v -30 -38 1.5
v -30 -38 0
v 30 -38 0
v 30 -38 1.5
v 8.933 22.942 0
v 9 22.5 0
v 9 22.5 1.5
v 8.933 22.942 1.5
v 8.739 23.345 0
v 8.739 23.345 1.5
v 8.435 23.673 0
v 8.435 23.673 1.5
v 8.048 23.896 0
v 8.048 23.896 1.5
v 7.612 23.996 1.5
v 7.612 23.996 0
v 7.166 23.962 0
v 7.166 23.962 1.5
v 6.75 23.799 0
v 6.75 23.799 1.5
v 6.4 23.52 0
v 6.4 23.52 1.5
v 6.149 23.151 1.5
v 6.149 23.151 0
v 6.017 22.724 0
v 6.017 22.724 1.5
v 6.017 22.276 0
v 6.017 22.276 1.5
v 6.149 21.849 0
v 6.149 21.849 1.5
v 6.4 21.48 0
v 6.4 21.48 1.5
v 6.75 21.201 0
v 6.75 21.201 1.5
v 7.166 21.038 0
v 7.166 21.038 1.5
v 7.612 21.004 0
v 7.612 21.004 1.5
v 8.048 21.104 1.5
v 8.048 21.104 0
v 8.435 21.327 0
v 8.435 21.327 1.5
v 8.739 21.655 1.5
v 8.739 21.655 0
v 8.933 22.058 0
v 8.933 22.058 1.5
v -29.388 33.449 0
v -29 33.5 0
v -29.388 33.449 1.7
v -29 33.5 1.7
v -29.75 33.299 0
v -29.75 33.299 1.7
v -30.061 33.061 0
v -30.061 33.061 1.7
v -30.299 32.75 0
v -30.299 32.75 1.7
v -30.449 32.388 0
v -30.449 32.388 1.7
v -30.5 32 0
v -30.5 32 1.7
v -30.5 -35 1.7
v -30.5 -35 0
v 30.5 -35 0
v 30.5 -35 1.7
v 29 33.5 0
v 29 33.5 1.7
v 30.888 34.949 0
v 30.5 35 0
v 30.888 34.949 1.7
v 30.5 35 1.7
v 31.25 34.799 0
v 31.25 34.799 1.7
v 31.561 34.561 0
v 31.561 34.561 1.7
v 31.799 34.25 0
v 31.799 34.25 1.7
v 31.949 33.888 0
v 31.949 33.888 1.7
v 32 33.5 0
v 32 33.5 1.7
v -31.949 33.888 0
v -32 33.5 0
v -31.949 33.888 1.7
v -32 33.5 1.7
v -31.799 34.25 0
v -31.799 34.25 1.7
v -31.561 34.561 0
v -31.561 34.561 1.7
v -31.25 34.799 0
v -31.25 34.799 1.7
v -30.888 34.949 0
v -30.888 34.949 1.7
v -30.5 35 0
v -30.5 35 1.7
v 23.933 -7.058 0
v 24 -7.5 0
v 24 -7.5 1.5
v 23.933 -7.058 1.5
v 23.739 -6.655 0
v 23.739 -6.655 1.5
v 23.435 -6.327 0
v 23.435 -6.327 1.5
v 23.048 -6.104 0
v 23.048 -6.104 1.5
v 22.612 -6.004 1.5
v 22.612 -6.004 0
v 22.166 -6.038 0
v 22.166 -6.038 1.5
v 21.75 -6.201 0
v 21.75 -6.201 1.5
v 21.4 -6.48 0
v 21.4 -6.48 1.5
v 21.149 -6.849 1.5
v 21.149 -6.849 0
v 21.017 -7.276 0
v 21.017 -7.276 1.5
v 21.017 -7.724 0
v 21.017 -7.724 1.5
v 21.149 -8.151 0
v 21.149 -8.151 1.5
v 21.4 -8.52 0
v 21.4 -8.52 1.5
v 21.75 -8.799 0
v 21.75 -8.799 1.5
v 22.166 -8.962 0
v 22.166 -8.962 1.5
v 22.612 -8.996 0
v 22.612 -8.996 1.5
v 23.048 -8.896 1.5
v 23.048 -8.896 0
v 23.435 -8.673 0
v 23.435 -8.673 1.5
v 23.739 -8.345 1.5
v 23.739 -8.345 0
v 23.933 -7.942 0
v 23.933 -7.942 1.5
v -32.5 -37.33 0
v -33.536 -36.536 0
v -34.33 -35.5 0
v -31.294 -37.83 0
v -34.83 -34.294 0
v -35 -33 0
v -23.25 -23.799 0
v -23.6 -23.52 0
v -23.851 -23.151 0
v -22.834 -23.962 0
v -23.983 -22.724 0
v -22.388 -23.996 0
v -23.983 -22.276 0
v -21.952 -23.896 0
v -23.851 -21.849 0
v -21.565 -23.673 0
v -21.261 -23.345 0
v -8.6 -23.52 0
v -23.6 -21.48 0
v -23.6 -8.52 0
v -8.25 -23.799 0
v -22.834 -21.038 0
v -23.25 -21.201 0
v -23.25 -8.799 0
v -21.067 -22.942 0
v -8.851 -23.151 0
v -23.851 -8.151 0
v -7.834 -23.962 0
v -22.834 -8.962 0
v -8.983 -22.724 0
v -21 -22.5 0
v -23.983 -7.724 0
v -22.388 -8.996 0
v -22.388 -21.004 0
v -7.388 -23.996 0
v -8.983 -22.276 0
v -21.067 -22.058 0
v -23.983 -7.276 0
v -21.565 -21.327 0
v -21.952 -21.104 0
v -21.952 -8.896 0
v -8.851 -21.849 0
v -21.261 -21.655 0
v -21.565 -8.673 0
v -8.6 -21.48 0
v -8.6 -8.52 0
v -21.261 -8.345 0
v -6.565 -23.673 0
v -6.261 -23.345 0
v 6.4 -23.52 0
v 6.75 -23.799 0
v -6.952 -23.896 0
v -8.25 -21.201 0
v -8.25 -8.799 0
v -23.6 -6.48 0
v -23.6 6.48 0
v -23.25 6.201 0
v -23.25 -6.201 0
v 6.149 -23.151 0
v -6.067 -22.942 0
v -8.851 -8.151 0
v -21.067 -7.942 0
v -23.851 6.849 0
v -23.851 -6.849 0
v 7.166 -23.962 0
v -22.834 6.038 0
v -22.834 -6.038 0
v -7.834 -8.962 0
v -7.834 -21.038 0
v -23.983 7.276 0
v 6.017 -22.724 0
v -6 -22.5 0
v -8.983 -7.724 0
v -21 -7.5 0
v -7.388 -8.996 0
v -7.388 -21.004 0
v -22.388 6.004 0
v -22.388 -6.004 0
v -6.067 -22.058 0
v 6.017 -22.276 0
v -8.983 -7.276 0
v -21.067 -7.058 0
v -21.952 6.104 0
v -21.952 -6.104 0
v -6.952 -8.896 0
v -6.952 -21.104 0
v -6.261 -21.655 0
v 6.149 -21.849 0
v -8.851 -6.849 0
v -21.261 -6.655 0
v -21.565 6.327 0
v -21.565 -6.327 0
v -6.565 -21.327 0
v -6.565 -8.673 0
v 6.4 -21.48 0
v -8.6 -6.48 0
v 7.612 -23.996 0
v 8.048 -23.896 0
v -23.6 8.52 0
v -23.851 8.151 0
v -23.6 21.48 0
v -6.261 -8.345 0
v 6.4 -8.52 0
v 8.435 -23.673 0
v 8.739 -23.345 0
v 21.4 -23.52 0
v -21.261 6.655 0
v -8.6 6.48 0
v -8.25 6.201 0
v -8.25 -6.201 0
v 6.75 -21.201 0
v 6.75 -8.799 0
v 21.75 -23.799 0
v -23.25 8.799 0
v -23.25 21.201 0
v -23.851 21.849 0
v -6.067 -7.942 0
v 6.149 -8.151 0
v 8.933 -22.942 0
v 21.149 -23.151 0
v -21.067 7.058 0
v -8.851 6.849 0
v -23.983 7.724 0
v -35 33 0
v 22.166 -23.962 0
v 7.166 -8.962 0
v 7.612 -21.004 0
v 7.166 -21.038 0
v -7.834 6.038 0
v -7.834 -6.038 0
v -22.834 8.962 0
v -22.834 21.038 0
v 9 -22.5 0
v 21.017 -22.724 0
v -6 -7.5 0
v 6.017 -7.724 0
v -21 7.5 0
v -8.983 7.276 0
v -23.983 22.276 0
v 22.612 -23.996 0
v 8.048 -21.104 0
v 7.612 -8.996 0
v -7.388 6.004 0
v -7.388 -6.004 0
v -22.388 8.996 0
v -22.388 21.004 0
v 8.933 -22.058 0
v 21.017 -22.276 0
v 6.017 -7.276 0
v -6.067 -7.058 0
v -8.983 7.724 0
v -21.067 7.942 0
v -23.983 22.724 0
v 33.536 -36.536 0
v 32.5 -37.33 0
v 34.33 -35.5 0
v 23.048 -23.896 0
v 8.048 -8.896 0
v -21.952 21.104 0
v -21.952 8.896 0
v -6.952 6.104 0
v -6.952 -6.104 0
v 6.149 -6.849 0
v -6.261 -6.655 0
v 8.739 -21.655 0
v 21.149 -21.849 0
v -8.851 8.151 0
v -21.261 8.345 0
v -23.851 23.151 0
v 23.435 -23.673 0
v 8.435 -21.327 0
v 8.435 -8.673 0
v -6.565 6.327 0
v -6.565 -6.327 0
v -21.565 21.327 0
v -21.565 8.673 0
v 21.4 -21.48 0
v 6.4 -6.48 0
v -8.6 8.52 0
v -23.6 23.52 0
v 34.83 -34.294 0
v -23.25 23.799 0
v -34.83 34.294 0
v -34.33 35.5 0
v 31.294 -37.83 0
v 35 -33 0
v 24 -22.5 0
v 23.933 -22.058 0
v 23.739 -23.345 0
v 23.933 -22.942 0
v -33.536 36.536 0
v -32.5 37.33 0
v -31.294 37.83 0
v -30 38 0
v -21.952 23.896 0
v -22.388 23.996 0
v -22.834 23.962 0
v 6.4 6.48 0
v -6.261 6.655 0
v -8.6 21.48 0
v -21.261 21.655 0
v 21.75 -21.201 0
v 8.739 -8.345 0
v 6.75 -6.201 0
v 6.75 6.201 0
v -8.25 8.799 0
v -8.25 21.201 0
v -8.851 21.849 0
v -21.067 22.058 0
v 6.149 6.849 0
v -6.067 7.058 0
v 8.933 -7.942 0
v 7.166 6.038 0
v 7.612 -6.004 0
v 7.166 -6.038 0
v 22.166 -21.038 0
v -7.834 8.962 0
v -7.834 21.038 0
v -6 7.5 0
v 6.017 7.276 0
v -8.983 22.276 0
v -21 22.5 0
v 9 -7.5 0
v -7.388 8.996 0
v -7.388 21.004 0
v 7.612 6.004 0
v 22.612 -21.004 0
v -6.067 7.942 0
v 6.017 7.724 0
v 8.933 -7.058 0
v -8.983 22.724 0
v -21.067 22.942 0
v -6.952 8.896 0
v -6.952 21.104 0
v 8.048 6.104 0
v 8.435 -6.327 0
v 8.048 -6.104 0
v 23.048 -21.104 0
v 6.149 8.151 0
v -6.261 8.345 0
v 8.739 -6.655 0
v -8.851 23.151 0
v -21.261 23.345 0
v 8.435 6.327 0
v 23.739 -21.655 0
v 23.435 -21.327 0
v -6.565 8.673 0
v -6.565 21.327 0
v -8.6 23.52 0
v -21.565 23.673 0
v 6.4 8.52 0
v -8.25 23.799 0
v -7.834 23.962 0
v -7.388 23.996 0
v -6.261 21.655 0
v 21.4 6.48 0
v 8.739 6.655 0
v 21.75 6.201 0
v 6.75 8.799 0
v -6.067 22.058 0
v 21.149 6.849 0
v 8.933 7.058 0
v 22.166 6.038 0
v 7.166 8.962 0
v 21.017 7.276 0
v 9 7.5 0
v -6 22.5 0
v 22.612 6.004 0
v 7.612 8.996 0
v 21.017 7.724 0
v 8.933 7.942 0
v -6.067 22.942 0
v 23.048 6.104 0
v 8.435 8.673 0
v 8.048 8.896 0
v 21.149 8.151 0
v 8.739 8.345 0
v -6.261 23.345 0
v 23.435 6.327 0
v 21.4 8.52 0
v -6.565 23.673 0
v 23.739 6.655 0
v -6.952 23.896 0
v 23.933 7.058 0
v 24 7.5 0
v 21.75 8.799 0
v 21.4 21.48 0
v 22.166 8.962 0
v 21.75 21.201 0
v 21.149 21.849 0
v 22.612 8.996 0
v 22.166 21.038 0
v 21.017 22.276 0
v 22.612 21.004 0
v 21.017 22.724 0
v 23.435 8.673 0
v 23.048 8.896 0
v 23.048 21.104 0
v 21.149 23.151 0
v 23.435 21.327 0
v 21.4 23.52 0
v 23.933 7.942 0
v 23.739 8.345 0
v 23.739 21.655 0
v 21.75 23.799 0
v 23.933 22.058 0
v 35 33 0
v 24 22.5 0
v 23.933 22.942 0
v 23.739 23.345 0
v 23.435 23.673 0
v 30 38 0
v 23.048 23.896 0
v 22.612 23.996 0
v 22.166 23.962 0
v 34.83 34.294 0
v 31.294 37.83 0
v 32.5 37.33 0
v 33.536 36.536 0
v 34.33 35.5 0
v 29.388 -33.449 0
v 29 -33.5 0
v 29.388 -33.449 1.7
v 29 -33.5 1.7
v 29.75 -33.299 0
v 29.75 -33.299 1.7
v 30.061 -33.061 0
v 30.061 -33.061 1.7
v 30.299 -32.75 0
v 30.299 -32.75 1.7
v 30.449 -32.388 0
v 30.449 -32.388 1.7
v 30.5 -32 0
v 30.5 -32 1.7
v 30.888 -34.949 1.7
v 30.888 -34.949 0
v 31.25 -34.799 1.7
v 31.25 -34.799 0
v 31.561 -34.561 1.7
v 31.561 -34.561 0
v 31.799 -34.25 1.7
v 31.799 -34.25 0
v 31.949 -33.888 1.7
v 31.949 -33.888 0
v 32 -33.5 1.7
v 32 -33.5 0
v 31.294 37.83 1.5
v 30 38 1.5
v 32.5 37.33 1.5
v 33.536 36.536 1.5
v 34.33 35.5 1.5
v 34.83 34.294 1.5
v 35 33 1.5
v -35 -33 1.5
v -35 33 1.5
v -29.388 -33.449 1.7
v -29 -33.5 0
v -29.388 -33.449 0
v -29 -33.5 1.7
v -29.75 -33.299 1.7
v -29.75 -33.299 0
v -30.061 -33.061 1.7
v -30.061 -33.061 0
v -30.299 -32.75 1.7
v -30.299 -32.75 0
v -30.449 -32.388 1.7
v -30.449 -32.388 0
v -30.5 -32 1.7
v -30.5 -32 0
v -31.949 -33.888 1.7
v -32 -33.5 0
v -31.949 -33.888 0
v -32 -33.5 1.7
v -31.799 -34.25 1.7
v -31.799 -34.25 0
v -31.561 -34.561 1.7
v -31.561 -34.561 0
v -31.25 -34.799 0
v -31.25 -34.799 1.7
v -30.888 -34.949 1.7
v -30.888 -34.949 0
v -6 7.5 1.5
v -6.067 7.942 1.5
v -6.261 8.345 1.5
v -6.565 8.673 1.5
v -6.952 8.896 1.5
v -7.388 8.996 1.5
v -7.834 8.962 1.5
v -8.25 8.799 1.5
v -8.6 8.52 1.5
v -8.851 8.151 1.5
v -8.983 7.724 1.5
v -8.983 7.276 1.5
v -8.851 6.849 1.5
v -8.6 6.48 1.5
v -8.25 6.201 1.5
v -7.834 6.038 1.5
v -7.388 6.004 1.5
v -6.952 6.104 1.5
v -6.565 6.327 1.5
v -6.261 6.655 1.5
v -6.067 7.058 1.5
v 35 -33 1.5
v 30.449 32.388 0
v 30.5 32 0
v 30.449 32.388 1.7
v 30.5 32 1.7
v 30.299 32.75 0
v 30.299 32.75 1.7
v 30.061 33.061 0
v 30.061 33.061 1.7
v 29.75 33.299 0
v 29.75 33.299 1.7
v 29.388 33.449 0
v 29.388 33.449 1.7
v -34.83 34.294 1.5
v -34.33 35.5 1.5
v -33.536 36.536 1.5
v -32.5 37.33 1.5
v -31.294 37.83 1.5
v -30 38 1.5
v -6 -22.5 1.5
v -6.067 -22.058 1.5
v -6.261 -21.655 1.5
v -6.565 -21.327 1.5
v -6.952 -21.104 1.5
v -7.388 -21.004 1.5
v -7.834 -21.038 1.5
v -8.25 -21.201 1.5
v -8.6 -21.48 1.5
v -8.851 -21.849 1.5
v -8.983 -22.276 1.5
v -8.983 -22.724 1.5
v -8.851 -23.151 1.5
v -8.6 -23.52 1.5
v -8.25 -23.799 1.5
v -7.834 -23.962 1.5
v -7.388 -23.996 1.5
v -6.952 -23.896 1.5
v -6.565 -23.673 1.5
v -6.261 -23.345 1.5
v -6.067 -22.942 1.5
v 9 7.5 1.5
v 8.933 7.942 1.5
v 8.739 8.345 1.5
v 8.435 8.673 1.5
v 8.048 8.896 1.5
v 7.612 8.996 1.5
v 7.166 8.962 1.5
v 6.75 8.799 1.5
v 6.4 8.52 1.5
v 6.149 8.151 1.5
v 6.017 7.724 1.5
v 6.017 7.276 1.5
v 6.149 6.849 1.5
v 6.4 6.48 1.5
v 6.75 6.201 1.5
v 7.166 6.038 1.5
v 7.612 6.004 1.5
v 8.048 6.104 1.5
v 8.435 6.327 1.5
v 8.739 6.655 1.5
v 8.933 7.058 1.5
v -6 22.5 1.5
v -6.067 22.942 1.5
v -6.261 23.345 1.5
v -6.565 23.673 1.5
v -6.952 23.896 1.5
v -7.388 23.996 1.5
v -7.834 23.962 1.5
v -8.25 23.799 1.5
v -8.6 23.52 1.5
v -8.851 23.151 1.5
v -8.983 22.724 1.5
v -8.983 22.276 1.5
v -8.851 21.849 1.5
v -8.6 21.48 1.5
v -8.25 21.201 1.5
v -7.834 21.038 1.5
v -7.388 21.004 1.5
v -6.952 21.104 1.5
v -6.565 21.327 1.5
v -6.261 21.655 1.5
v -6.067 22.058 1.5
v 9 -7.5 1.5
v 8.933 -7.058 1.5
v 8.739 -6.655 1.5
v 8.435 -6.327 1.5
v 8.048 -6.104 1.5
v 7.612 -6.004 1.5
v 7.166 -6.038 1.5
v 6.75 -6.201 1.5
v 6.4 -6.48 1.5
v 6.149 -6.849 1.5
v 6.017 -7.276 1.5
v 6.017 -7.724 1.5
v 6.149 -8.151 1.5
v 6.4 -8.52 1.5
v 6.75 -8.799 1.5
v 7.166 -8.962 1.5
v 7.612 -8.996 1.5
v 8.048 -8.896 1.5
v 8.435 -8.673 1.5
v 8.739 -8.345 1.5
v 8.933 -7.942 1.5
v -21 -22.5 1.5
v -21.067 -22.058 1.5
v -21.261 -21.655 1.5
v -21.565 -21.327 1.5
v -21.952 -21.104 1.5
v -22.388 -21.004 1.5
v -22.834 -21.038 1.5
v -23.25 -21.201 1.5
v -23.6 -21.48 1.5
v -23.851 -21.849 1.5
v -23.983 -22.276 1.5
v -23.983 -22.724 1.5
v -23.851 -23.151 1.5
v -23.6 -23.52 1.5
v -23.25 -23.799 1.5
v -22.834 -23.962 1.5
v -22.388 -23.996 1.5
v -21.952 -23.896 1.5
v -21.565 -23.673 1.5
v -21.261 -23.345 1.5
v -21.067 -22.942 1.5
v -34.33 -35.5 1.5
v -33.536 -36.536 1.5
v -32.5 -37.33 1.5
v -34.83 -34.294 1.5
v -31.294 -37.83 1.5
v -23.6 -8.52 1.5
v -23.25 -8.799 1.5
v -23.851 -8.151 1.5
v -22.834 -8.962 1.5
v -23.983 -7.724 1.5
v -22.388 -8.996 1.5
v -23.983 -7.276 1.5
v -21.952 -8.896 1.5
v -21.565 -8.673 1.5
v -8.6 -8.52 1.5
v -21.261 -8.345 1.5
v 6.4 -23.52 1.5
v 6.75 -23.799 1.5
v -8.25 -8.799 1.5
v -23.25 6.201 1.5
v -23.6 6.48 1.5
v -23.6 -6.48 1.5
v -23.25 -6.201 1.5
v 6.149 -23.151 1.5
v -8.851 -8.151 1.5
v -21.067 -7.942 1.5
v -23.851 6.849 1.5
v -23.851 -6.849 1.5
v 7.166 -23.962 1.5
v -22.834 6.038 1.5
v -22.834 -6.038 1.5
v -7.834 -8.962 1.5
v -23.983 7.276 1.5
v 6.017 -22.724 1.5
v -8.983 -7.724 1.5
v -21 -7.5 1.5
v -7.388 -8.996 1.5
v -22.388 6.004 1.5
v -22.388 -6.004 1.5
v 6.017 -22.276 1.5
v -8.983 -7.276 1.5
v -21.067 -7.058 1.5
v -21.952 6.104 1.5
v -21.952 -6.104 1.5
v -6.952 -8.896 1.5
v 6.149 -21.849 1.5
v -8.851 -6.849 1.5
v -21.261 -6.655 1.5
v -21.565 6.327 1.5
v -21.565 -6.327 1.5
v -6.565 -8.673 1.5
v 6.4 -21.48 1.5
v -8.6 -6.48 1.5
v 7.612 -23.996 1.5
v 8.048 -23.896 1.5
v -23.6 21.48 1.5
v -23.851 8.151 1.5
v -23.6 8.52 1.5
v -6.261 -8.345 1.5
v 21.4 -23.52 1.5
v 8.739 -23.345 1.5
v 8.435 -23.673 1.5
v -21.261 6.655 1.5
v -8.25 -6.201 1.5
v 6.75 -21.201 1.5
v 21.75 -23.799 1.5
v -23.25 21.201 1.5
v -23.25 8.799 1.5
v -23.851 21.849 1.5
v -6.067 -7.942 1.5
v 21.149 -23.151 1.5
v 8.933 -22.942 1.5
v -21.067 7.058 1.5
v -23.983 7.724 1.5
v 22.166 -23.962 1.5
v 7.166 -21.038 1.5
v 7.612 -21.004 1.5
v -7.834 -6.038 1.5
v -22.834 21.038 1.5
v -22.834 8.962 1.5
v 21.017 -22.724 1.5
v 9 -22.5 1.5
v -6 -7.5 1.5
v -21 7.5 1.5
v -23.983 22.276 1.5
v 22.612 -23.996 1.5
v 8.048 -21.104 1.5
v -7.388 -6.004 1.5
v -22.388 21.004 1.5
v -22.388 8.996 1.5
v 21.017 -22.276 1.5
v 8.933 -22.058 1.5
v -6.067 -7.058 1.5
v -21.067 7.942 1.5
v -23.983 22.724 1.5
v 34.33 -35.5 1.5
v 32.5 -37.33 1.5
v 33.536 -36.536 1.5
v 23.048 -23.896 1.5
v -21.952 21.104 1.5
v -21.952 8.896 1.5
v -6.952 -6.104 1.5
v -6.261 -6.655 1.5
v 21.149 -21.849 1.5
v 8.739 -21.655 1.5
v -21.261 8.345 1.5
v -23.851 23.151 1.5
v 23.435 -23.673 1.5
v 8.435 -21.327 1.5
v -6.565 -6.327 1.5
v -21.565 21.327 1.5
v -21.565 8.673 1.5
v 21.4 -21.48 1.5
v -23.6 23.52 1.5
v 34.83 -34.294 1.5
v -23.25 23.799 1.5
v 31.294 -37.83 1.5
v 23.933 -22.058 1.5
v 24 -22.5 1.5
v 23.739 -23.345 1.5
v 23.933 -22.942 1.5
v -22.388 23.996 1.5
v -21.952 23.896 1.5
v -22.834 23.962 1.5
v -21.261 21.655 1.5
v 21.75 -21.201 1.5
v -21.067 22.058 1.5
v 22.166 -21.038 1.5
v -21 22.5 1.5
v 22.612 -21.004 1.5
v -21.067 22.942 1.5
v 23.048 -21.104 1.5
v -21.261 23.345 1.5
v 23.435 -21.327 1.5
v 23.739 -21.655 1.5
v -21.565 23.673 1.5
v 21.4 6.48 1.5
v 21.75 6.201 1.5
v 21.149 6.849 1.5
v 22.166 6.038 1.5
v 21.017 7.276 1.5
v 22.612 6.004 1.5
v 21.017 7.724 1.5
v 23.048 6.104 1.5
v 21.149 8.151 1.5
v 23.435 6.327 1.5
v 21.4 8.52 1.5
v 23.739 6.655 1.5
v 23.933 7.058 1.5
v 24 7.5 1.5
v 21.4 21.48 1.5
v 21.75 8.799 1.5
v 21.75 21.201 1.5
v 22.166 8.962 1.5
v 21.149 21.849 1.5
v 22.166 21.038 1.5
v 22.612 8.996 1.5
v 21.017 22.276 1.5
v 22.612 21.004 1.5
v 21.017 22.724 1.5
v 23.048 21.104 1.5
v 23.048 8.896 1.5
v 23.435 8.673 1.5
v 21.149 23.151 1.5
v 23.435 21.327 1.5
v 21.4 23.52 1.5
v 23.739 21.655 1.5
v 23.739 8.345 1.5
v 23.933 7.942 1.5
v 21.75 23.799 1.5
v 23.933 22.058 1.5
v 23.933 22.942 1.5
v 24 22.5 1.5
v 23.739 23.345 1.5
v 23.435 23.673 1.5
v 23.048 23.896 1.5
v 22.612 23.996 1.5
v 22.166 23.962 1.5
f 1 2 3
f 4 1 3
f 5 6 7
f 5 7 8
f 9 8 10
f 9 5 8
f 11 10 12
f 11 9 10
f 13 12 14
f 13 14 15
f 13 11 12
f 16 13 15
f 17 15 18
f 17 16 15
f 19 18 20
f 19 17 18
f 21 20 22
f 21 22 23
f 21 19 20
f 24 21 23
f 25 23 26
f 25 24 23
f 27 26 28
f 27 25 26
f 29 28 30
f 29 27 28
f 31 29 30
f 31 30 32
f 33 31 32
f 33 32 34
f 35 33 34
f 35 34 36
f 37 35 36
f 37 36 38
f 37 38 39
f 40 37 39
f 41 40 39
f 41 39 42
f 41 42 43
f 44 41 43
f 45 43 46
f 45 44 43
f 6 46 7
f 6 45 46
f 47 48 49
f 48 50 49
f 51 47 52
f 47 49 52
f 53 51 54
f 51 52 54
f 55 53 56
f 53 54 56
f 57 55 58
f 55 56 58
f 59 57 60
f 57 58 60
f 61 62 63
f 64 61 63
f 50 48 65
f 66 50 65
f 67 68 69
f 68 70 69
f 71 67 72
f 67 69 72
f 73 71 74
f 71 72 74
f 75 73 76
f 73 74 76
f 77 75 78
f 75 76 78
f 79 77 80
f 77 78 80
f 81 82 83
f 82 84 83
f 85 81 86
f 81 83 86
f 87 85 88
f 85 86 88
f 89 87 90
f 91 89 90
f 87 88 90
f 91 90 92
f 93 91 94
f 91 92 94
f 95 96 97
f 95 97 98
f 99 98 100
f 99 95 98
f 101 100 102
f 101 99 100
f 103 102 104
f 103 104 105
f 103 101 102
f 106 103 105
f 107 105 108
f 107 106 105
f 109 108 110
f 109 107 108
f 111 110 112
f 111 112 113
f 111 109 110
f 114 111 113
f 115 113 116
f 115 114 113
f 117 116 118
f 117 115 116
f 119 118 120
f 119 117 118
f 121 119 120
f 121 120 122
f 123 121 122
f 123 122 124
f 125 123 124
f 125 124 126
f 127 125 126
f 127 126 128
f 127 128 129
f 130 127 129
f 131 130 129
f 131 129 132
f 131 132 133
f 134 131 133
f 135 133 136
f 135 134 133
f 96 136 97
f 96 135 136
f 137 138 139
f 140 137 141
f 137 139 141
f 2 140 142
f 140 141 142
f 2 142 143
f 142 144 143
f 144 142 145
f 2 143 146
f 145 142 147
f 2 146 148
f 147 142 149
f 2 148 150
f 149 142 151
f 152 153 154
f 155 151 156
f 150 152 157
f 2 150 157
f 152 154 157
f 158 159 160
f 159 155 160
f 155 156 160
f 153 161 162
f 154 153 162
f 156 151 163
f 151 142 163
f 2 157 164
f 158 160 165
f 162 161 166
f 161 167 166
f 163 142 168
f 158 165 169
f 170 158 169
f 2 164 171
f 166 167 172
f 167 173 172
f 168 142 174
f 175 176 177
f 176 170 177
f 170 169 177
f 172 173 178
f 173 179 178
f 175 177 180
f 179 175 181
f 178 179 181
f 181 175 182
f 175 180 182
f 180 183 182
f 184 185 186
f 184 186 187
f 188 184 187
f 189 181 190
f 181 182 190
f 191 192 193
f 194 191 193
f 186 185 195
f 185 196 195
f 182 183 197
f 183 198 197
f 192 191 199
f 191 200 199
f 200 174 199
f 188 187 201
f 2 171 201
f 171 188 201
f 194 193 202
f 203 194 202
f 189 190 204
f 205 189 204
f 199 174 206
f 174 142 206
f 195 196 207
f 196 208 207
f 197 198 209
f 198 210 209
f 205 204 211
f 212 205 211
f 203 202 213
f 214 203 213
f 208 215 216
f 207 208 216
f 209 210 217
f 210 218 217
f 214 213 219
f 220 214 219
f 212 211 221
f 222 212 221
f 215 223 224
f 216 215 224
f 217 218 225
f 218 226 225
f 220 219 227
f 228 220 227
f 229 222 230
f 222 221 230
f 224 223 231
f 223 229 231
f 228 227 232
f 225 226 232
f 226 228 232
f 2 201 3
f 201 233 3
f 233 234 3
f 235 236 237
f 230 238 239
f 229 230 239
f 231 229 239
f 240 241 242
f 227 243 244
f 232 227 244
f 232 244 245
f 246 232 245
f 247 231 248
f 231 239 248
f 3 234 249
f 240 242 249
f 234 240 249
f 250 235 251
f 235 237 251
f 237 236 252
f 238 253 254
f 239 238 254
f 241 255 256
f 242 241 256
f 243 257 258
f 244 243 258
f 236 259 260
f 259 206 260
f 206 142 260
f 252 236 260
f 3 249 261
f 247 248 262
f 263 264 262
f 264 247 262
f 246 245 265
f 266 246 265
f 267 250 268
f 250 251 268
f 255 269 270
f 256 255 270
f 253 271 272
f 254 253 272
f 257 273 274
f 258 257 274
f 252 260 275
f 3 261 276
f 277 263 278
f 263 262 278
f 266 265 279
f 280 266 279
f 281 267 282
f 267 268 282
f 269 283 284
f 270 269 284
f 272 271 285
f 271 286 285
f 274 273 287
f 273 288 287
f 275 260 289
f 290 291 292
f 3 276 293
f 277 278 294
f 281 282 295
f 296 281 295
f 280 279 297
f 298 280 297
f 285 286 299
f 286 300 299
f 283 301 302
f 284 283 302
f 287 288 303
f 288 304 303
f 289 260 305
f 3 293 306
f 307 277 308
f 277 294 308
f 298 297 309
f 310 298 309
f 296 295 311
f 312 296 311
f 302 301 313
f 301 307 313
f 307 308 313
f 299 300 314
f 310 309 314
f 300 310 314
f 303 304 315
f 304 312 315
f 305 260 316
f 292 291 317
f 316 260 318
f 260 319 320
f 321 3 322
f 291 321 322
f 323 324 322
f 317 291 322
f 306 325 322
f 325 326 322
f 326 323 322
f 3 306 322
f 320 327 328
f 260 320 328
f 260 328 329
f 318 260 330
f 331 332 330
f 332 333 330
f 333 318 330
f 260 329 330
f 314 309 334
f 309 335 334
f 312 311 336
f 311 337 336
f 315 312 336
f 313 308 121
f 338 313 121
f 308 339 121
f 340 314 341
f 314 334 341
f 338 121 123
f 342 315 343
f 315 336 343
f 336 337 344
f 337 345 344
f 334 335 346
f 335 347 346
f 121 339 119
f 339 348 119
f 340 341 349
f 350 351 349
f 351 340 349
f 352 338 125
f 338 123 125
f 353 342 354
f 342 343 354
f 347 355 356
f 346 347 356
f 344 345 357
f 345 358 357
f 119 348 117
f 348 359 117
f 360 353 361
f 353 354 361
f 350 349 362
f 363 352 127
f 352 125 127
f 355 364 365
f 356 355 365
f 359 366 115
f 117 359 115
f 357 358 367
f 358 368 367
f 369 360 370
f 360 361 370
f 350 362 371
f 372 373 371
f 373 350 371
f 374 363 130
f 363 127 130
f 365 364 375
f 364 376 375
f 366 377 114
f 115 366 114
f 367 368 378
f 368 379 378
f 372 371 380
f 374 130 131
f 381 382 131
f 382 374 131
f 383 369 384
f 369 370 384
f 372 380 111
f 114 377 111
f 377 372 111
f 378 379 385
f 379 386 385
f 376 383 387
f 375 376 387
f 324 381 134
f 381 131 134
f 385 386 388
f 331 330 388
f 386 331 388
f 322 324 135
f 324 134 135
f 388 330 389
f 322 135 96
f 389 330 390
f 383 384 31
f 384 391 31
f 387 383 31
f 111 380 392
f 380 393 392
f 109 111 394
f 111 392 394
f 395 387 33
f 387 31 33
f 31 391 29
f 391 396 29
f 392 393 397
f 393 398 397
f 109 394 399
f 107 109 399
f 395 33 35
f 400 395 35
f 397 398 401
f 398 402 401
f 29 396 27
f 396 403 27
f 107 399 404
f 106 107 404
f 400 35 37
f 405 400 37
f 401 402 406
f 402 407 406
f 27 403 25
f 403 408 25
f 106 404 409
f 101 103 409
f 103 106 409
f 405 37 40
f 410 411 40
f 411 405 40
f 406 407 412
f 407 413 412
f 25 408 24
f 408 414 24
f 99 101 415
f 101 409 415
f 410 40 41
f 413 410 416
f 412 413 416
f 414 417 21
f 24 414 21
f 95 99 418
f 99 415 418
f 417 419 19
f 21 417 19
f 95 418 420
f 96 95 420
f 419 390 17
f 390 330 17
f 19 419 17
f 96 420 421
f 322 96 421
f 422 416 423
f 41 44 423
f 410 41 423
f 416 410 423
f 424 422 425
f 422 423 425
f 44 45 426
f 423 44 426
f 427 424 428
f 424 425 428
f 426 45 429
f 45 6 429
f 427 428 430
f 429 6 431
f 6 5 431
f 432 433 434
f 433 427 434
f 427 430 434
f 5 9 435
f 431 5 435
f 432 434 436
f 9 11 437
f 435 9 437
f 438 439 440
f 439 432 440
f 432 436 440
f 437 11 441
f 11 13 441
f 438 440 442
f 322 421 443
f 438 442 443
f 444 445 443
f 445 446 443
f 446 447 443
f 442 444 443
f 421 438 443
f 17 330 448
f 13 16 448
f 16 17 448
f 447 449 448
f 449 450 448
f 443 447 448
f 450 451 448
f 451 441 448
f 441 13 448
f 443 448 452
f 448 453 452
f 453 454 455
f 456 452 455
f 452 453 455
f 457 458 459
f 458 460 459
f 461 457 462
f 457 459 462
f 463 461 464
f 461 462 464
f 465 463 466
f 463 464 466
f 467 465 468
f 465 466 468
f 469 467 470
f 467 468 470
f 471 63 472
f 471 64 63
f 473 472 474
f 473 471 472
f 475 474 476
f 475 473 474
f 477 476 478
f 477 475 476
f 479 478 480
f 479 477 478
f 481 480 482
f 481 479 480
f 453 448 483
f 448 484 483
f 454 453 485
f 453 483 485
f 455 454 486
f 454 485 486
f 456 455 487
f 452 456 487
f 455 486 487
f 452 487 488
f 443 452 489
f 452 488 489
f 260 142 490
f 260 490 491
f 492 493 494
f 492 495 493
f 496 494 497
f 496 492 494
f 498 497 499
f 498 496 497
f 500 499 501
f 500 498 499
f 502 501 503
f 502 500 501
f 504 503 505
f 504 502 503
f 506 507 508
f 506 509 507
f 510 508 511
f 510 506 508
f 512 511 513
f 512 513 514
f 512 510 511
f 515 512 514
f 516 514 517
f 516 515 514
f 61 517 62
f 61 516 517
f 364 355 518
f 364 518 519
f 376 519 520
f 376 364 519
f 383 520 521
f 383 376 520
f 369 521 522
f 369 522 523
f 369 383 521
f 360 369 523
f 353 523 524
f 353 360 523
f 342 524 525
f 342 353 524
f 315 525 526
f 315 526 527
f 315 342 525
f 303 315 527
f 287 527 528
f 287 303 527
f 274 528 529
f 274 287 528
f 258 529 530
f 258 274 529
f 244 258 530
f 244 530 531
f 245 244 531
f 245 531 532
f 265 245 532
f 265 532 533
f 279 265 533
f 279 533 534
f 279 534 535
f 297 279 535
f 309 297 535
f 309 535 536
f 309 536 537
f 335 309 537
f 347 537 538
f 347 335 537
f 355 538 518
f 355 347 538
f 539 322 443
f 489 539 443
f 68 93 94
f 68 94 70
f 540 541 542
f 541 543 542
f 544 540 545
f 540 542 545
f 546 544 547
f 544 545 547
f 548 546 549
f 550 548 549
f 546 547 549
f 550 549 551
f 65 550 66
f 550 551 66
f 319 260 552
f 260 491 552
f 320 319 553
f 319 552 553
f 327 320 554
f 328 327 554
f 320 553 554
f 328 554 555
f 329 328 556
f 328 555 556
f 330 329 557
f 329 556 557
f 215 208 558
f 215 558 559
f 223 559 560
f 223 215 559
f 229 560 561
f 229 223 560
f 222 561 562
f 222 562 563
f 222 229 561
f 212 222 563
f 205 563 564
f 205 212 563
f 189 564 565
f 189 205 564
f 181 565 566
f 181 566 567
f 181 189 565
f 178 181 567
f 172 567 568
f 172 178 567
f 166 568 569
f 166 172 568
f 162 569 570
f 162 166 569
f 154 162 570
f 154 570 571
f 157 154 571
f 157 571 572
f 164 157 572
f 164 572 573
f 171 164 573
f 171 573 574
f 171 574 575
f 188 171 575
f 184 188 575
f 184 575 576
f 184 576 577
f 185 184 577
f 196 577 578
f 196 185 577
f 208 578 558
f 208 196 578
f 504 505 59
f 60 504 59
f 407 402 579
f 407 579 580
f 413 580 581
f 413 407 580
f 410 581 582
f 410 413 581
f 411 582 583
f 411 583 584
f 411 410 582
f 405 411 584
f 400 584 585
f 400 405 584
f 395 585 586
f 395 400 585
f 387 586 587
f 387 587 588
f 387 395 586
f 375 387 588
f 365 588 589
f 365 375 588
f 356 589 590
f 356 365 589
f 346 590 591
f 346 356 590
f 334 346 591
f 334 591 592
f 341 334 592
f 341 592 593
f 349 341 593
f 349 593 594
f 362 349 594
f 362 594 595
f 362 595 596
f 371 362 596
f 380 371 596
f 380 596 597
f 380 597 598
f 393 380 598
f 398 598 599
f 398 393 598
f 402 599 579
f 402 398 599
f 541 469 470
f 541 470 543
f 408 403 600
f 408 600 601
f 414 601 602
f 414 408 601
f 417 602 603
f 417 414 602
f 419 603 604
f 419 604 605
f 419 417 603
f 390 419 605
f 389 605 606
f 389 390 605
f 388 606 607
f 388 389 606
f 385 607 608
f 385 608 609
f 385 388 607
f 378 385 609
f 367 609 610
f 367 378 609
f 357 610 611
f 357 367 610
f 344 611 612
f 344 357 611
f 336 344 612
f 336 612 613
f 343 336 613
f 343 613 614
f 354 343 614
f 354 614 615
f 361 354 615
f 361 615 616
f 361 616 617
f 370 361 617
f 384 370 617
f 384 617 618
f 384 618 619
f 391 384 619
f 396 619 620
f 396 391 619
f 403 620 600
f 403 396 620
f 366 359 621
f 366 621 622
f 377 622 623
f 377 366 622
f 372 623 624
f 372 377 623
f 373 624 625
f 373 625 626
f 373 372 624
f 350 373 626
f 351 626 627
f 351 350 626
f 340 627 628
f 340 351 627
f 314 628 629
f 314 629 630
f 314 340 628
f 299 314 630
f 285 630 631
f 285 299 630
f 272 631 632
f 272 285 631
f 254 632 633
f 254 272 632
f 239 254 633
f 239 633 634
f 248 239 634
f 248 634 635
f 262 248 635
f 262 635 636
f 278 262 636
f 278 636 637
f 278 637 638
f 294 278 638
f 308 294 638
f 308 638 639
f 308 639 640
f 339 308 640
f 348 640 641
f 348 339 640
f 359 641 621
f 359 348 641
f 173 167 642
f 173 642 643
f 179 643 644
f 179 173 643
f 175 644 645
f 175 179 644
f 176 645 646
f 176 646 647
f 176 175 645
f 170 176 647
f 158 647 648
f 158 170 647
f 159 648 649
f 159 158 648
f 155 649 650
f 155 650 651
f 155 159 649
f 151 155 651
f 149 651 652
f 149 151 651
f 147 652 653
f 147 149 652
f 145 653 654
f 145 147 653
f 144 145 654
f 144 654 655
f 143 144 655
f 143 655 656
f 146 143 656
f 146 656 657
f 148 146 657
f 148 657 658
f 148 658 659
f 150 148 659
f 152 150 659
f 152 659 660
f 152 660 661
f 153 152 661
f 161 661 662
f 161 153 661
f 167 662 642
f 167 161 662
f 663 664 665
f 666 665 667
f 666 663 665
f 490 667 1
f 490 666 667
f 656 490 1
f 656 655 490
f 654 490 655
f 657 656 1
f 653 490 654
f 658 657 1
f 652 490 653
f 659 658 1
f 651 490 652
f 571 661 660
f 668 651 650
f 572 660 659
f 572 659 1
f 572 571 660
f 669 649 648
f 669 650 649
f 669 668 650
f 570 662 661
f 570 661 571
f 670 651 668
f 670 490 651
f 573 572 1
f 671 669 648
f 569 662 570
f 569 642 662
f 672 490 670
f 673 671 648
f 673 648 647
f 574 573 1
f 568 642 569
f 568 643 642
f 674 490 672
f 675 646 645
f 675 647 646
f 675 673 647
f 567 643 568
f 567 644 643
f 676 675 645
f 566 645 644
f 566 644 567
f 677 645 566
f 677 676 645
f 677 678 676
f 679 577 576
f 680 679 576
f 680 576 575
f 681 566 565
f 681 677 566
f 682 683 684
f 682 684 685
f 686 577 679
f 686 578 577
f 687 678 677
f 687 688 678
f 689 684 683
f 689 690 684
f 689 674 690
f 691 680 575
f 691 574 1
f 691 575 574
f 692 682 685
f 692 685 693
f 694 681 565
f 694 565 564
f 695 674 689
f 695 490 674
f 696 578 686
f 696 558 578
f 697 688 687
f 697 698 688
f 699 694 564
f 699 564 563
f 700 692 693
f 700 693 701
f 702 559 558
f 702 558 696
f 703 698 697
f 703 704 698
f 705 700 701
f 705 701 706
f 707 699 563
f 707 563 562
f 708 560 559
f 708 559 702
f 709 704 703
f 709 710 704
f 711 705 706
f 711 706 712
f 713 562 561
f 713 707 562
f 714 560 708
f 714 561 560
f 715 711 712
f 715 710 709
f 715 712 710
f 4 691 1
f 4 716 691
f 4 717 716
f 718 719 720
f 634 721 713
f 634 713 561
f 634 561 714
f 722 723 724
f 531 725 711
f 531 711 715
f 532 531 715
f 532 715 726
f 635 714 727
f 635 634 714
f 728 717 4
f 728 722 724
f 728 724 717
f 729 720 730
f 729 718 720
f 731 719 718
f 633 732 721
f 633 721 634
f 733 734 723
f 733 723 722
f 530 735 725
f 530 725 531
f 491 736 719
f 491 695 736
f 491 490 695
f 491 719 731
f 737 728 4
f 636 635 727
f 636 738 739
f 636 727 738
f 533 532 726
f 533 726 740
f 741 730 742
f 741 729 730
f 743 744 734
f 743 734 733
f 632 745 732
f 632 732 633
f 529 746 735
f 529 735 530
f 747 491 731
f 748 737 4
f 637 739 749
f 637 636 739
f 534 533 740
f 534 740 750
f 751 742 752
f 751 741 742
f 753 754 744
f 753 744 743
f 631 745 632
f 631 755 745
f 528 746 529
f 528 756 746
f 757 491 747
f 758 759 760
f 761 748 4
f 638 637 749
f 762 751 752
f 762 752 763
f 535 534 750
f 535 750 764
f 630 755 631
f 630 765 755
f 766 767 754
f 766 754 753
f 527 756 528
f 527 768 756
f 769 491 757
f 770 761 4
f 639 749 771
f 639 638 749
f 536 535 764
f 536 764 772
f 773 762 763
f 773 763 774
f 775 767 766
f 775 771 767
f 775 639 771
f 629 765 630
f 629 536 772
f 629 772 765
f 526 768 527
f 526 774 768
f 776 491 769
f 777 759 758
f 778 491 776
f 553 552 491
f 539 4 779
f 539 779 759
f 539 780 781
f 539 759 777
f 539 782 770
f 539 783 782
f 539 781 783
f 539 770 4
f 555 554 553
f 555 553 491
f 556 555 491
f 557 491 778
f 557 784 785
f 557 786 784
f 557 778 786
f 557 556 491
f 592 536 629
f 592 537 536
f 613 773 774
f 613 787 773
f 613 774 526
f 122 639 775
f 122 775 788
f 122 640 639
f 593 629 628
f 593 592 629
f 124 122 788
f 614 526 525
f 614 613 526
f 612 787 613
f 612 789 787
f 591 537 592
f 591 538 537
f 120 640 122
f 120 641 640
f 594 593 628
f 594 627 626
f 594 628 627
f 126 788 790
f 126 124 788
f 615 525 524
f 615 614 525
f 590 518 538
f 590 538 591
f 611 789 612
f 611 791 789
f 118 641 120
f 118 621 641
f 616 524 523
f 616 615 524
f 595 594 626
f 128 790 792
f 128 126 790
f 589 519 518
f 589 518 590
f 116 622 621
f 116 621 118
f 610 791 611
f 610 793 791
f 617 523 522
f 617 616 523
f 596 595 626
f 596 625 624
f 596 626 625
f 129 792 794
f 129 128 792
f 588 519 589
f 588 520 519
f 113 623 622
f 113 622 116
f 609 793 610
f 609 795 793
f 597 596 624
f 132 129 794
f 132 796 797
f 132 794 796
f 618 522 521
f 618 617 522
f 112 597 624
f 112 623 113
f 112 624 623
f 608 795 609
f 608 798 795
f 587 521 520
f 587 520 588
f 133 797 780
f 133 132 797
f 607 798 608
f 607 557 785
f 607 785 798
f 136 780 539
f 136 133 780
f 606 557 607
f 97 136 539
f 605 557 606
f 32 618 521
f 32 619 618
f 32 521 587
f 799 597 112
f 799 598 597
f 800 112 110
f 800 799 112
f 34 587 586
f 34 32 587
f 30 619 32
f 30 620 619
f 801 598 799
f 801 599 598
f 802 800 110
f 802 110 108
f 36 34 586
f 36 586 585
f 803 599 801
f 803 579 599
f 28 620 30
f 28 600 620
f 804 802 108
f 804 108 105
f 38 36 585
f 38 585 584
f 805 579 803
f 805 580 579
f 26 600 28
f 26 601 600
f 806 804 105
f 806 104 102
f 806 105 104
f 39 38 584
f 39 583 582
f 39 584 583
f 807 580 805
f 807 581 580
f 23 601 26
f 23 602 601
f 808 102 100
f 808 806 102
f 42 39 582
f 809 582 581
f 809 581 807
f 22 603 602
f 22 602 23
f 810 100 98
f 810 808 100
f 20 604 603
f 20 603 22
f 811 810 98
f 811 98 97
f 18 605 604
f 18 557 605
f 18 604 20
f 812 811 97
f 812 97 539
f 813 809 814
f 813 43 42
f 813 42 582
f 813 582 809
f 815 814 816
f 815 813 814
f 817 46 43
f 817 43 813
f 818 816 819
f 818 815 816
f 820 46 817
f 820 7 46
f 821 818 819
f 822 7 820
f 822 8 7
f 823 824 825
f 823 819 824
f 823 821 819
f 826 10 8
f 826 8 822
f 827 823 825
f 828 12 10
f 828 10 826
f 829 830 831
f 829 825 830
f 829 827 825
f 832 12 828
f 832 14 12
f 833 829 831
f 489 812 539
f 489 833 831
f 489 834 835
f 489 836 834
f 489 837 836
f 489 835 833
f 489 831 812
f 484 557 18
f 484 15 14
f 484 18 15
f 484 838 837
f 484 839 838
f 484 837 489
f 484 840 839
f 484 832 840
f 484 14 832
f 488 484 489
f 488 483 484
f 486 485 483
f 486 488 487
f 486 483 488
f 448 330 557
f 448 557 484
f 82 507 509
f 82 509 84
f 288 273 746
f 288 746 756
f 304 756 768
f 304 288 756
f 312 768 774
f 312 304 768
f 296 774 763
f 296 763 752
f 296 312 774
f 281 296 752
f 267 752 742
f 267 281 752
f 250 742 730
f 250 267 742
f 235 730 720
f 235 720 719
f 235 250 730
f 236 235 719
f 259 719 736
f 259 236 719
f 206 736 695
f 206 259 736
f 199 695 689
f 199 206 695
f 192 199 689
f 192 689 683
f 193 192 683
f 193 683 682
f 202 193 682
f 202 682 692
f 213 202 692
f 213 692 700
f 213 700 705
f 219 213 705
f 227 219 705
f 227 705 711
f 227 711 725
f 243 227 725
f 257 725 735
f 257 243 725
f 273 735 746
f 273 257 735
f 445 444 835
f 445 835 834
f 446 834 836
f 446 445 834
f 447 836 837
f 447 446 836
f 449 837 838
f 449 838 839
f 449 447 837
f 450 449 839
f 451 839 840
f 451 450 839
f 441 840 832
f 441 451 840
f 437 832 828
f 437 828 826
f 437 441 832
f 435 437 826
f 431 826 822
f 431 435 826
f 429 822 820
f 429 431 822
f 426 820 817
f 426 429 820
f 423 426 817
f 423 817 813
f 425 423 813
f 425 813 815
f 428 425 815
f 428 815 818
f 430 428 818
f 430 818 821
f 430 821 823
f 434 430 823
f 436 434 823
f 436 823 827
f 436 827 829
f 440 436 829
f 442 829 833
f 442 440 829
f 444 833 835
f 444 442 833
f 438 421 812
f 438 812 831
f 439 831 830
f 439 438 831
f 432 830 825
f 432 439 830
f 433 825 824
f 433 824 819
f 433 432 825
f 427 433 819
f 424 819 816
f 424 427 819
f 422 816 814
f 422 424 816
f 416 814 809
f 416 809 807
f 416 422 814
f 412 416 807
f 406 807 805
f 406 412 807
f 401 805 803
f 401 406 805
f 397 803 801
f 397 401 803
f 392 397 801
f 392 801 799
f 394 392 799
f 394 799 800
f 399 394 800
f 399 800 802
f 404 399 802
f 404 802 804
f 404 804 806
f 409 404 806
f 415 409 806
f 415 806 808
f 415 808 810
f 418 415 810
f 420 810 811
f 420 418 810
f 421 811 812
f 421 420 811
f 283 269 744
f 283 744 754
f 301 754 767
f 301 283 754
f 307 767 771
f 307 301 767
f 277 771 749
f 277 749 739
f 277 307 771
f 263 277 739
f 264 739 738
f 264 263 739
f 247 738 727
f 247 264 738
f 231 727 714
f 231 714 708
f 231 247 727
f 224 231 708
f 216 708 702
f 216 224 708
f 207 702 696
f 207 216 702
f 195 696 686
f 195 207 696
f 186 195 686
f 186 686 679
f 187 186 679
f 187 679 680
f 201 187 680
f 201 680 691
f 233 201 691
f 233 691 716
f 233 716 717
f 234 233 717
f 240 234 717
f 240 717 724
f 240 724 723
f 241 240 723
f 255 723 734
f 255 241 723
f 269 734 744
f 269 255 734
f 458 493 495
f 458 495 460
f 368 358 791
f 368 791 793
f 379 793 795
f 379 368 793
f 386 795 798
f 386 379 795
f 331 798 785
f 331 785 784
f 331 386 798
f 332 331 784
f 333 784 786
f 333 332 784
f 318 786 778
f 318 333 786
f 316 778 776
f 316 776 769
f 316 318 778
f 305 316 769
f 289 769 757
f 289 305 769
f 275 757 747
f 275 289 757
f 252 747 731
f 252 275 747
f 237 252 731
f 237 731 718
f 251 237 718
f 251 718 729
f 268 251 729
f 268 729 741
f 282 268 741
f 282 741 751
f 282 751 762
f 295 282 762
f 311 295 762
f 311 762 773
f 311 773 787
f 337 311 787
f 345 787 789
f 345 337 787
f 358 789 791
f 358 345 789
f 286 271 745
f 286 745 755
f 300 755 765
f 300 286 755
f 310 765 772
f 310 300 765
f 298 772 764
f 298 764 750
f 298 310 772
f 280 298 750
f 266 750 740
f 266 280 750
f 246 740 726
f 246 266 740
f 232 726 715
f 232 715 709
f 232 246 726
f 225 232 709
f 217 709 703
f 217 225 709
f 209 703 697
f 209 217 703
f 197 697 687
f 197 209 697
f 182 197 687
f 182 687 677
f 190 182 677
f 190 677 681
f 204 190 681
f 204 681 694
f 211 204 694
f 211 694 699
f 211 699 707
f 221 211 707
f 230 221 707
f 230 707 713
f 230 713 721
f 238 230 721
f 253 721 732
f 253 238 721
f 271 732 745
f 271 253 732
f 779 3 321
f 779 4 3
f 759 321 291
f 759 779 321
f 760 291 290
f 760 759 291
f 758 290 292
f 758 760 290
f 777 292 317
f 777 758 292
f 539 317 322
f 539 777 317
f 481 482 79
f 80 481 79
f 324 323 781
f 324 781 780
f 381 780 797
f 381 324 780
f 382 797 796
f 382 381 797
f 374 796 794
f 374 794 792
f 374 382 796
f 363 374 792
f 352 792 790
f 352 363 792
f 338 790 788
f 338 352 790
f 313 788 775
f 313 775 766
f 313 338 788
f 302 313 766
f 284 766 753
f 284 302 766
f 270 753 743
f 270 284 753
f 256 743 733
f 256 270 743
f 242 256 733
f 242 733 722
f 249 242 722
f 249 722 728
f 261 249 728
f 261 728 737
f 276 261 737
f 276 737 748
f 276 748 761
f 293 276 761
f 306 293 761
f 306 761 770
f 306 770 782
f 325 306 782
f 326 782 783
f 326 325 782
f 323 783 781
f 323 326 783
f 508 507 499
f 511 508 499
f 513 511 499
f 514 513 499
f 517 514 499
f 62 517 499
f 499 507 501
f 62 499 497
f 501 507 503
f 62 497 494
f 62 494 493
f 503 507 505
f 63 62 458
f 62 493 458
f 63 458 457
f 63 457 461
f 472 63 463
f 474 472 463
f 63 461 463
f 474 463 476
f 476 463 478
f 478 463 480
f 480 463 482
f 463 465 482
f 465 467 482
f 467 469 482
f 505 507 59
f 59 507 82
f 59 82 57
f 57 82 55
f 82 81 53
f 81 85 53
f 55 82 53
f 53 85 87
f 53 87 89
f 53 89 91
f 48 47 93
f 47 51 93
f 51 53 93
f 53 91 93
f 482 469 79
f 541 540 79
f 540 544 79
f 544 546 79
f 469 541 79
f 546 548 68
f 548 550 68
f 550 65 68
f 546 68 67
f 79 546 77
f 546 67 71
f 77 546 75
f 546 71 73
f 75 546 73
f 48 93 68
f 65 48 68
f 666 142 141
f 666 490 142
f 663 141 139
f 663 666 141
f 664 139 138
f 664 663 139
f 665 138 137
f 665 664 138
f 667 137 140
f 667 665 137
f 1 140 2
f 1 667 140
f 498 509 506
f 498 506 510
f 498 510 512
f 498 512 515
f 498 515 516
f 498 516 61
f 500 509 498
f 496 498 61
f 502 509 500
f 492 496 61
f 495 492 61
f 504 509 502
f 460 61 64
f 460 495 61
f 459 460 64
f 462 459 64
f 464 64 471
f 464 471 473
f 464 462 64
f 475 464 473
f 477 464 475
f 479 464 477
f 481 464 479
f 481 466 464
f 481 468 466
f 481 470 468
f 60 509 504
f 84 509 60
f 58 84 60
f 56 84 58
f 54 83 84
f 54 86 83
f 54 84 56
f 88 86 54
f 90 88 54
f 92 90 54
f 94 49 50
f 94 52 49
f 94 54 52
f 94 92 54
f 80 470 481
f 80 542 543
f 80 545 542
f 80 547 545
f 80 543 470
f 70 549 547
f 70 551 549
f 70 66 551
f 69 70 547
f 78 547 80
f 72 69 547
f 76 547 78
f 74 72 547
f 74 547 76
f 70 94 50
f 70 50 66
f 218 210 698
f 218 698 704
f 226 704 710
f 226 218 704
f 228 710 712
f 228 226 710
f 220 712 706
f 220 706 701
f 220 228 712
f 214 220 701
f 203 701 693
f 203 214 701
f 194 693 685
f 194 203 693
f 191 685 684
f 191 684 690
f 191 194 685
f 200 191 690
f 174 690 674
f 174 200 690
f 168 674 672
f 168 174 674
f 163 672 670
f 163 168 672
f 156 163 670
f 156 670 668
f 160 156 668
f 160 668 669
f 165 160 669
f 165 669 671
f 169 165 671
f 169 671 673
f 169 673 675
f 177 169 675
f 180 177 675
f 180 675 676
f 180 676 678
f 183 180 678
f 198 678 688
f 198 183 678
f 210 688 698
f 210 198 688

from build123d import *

# Parameters (mm, degrees)
SKETCH001_W  = 70
SKETCH001_H  = 76
SKETCH001_R  = 1.5
PAD_DEPTH    = 1.5
FILLET_R     = 5
SKETCH_W     = 64
SKETCH_H     = 70
SKETCH_W_2   = 61
SKETCH_H_2   = 67
PAD001_DEPTH = 1.7
FILLET001_R  = 1.5


with BuildPart() as body:
    # Sketch001 → Pad (new body)
    with BuildSketch(Plane.XY):
        Rectangle(SKETCH001_W, SKETCH001_H)
        with Locations((-22.5, 22.5)):
            Circle(SKETCH001_R, mode=Mode.SUBTRACT)
        with Locations((-7.5, 22.5)):
            Circle(SKETCH001_R, mode=Mode.SUBTRACT)
        with Locations((7.5, 22.5)):
            Circle(SKETCH001_R, mode=Mode.SUBTRACT)
        with Locations((22.5, 22.5)):
            Circle(SKETCH001_R, mode=Mode.SUBTRACT)
        with Locations((-22.5, 7.5)):
            Circle(SKETCH001_R, mode=Mode.SUBTRACT)
        with Locations((-7.5, 7.5)):
            Circle(SKETCH001_R, mode=Mode.SUBTRACT)
        with Locations((7.5, 7.5)):
            Circle(SKETCH001_R, mode=Mode.SUBTRACT)
        with Locations((22.5, 7.5)):
            Circle(SKETCH001_R, mode=Mode.SUBTRACT)
        with Locations((-22.5, -7.5)):
            Circle(SKETCH001_R, mode=Mode.SUBTRACT)
        with Locations((-7.5, -7.5)):
            Circle(SKETCH001_R, mode=Mode.SUBTRACT)
        with Locations((7.5, -7.5)):
            Circle(SKETCH001_R, mode=Mode.SUBTRACT)
        with Locations((22.5, -7.5)):
            Circle(SKETCH001_R, mode=Mode.SUBTRACT)
        with Locations((-22.5, -22.5)):
            Circle(SKETCH001_R, mode=Mode.SUBTRACT)
        with Locations((-7.5, -22.5)):
            Circle(SKETCH001_R, mode=Mode.SUBTRACT)
        with Locations((7.5, -22.5)):
            Circle(SKETCH001_R, mode=Mode.SUBTRACT)
        with Locations((22.5, -22.5)):
            Circle(SKETCH001_R, mode=Mode.SUBTRACT)
    extrude(amount=PAD_DEPTH)

    # Fillet
    fillet_edges = [body.edges().sort_by_distance(p)[0] for p in [
        (-35, 38, 0.75),
        (35, -38, 0.75),
        (-35, -38, 0.75),
        (35, 38, 0.75),
    ]]
    fillet(fillet_edges, radius=FILLET_R)


with BuildPart() as body001:
    # Sketch → Pad001 (new body)
    with BuildSketch(Plane.XY):
        Rectangle(SKETCH_W, SKETCH_H)
        Rectangle(SKETCH_W_2, SKETCH_H_2, mode=Mode.SUBTRACT)
    extrude(amount=PAD001_DEPTH)

    # Fillet001
    fillet001_edges = [body001.edges().sort_by_distance(p)[0] for p in [
        (32, -35, 0.85),
        (30.5, -33.5, 0.85),
        (32, 35, 0.85),
        (30.5, 33.5, 0.85),
        (-30.5, 33.5, 0.85),
        (-32, 35, 0.85),
        (-32, -35, 0.85),
        (-30.5, -33.5, 0.85),
    ]]
    fillet(fillet001_edges, radius=FILLET001_R)


solid = Compound([body.part, body001.part])
